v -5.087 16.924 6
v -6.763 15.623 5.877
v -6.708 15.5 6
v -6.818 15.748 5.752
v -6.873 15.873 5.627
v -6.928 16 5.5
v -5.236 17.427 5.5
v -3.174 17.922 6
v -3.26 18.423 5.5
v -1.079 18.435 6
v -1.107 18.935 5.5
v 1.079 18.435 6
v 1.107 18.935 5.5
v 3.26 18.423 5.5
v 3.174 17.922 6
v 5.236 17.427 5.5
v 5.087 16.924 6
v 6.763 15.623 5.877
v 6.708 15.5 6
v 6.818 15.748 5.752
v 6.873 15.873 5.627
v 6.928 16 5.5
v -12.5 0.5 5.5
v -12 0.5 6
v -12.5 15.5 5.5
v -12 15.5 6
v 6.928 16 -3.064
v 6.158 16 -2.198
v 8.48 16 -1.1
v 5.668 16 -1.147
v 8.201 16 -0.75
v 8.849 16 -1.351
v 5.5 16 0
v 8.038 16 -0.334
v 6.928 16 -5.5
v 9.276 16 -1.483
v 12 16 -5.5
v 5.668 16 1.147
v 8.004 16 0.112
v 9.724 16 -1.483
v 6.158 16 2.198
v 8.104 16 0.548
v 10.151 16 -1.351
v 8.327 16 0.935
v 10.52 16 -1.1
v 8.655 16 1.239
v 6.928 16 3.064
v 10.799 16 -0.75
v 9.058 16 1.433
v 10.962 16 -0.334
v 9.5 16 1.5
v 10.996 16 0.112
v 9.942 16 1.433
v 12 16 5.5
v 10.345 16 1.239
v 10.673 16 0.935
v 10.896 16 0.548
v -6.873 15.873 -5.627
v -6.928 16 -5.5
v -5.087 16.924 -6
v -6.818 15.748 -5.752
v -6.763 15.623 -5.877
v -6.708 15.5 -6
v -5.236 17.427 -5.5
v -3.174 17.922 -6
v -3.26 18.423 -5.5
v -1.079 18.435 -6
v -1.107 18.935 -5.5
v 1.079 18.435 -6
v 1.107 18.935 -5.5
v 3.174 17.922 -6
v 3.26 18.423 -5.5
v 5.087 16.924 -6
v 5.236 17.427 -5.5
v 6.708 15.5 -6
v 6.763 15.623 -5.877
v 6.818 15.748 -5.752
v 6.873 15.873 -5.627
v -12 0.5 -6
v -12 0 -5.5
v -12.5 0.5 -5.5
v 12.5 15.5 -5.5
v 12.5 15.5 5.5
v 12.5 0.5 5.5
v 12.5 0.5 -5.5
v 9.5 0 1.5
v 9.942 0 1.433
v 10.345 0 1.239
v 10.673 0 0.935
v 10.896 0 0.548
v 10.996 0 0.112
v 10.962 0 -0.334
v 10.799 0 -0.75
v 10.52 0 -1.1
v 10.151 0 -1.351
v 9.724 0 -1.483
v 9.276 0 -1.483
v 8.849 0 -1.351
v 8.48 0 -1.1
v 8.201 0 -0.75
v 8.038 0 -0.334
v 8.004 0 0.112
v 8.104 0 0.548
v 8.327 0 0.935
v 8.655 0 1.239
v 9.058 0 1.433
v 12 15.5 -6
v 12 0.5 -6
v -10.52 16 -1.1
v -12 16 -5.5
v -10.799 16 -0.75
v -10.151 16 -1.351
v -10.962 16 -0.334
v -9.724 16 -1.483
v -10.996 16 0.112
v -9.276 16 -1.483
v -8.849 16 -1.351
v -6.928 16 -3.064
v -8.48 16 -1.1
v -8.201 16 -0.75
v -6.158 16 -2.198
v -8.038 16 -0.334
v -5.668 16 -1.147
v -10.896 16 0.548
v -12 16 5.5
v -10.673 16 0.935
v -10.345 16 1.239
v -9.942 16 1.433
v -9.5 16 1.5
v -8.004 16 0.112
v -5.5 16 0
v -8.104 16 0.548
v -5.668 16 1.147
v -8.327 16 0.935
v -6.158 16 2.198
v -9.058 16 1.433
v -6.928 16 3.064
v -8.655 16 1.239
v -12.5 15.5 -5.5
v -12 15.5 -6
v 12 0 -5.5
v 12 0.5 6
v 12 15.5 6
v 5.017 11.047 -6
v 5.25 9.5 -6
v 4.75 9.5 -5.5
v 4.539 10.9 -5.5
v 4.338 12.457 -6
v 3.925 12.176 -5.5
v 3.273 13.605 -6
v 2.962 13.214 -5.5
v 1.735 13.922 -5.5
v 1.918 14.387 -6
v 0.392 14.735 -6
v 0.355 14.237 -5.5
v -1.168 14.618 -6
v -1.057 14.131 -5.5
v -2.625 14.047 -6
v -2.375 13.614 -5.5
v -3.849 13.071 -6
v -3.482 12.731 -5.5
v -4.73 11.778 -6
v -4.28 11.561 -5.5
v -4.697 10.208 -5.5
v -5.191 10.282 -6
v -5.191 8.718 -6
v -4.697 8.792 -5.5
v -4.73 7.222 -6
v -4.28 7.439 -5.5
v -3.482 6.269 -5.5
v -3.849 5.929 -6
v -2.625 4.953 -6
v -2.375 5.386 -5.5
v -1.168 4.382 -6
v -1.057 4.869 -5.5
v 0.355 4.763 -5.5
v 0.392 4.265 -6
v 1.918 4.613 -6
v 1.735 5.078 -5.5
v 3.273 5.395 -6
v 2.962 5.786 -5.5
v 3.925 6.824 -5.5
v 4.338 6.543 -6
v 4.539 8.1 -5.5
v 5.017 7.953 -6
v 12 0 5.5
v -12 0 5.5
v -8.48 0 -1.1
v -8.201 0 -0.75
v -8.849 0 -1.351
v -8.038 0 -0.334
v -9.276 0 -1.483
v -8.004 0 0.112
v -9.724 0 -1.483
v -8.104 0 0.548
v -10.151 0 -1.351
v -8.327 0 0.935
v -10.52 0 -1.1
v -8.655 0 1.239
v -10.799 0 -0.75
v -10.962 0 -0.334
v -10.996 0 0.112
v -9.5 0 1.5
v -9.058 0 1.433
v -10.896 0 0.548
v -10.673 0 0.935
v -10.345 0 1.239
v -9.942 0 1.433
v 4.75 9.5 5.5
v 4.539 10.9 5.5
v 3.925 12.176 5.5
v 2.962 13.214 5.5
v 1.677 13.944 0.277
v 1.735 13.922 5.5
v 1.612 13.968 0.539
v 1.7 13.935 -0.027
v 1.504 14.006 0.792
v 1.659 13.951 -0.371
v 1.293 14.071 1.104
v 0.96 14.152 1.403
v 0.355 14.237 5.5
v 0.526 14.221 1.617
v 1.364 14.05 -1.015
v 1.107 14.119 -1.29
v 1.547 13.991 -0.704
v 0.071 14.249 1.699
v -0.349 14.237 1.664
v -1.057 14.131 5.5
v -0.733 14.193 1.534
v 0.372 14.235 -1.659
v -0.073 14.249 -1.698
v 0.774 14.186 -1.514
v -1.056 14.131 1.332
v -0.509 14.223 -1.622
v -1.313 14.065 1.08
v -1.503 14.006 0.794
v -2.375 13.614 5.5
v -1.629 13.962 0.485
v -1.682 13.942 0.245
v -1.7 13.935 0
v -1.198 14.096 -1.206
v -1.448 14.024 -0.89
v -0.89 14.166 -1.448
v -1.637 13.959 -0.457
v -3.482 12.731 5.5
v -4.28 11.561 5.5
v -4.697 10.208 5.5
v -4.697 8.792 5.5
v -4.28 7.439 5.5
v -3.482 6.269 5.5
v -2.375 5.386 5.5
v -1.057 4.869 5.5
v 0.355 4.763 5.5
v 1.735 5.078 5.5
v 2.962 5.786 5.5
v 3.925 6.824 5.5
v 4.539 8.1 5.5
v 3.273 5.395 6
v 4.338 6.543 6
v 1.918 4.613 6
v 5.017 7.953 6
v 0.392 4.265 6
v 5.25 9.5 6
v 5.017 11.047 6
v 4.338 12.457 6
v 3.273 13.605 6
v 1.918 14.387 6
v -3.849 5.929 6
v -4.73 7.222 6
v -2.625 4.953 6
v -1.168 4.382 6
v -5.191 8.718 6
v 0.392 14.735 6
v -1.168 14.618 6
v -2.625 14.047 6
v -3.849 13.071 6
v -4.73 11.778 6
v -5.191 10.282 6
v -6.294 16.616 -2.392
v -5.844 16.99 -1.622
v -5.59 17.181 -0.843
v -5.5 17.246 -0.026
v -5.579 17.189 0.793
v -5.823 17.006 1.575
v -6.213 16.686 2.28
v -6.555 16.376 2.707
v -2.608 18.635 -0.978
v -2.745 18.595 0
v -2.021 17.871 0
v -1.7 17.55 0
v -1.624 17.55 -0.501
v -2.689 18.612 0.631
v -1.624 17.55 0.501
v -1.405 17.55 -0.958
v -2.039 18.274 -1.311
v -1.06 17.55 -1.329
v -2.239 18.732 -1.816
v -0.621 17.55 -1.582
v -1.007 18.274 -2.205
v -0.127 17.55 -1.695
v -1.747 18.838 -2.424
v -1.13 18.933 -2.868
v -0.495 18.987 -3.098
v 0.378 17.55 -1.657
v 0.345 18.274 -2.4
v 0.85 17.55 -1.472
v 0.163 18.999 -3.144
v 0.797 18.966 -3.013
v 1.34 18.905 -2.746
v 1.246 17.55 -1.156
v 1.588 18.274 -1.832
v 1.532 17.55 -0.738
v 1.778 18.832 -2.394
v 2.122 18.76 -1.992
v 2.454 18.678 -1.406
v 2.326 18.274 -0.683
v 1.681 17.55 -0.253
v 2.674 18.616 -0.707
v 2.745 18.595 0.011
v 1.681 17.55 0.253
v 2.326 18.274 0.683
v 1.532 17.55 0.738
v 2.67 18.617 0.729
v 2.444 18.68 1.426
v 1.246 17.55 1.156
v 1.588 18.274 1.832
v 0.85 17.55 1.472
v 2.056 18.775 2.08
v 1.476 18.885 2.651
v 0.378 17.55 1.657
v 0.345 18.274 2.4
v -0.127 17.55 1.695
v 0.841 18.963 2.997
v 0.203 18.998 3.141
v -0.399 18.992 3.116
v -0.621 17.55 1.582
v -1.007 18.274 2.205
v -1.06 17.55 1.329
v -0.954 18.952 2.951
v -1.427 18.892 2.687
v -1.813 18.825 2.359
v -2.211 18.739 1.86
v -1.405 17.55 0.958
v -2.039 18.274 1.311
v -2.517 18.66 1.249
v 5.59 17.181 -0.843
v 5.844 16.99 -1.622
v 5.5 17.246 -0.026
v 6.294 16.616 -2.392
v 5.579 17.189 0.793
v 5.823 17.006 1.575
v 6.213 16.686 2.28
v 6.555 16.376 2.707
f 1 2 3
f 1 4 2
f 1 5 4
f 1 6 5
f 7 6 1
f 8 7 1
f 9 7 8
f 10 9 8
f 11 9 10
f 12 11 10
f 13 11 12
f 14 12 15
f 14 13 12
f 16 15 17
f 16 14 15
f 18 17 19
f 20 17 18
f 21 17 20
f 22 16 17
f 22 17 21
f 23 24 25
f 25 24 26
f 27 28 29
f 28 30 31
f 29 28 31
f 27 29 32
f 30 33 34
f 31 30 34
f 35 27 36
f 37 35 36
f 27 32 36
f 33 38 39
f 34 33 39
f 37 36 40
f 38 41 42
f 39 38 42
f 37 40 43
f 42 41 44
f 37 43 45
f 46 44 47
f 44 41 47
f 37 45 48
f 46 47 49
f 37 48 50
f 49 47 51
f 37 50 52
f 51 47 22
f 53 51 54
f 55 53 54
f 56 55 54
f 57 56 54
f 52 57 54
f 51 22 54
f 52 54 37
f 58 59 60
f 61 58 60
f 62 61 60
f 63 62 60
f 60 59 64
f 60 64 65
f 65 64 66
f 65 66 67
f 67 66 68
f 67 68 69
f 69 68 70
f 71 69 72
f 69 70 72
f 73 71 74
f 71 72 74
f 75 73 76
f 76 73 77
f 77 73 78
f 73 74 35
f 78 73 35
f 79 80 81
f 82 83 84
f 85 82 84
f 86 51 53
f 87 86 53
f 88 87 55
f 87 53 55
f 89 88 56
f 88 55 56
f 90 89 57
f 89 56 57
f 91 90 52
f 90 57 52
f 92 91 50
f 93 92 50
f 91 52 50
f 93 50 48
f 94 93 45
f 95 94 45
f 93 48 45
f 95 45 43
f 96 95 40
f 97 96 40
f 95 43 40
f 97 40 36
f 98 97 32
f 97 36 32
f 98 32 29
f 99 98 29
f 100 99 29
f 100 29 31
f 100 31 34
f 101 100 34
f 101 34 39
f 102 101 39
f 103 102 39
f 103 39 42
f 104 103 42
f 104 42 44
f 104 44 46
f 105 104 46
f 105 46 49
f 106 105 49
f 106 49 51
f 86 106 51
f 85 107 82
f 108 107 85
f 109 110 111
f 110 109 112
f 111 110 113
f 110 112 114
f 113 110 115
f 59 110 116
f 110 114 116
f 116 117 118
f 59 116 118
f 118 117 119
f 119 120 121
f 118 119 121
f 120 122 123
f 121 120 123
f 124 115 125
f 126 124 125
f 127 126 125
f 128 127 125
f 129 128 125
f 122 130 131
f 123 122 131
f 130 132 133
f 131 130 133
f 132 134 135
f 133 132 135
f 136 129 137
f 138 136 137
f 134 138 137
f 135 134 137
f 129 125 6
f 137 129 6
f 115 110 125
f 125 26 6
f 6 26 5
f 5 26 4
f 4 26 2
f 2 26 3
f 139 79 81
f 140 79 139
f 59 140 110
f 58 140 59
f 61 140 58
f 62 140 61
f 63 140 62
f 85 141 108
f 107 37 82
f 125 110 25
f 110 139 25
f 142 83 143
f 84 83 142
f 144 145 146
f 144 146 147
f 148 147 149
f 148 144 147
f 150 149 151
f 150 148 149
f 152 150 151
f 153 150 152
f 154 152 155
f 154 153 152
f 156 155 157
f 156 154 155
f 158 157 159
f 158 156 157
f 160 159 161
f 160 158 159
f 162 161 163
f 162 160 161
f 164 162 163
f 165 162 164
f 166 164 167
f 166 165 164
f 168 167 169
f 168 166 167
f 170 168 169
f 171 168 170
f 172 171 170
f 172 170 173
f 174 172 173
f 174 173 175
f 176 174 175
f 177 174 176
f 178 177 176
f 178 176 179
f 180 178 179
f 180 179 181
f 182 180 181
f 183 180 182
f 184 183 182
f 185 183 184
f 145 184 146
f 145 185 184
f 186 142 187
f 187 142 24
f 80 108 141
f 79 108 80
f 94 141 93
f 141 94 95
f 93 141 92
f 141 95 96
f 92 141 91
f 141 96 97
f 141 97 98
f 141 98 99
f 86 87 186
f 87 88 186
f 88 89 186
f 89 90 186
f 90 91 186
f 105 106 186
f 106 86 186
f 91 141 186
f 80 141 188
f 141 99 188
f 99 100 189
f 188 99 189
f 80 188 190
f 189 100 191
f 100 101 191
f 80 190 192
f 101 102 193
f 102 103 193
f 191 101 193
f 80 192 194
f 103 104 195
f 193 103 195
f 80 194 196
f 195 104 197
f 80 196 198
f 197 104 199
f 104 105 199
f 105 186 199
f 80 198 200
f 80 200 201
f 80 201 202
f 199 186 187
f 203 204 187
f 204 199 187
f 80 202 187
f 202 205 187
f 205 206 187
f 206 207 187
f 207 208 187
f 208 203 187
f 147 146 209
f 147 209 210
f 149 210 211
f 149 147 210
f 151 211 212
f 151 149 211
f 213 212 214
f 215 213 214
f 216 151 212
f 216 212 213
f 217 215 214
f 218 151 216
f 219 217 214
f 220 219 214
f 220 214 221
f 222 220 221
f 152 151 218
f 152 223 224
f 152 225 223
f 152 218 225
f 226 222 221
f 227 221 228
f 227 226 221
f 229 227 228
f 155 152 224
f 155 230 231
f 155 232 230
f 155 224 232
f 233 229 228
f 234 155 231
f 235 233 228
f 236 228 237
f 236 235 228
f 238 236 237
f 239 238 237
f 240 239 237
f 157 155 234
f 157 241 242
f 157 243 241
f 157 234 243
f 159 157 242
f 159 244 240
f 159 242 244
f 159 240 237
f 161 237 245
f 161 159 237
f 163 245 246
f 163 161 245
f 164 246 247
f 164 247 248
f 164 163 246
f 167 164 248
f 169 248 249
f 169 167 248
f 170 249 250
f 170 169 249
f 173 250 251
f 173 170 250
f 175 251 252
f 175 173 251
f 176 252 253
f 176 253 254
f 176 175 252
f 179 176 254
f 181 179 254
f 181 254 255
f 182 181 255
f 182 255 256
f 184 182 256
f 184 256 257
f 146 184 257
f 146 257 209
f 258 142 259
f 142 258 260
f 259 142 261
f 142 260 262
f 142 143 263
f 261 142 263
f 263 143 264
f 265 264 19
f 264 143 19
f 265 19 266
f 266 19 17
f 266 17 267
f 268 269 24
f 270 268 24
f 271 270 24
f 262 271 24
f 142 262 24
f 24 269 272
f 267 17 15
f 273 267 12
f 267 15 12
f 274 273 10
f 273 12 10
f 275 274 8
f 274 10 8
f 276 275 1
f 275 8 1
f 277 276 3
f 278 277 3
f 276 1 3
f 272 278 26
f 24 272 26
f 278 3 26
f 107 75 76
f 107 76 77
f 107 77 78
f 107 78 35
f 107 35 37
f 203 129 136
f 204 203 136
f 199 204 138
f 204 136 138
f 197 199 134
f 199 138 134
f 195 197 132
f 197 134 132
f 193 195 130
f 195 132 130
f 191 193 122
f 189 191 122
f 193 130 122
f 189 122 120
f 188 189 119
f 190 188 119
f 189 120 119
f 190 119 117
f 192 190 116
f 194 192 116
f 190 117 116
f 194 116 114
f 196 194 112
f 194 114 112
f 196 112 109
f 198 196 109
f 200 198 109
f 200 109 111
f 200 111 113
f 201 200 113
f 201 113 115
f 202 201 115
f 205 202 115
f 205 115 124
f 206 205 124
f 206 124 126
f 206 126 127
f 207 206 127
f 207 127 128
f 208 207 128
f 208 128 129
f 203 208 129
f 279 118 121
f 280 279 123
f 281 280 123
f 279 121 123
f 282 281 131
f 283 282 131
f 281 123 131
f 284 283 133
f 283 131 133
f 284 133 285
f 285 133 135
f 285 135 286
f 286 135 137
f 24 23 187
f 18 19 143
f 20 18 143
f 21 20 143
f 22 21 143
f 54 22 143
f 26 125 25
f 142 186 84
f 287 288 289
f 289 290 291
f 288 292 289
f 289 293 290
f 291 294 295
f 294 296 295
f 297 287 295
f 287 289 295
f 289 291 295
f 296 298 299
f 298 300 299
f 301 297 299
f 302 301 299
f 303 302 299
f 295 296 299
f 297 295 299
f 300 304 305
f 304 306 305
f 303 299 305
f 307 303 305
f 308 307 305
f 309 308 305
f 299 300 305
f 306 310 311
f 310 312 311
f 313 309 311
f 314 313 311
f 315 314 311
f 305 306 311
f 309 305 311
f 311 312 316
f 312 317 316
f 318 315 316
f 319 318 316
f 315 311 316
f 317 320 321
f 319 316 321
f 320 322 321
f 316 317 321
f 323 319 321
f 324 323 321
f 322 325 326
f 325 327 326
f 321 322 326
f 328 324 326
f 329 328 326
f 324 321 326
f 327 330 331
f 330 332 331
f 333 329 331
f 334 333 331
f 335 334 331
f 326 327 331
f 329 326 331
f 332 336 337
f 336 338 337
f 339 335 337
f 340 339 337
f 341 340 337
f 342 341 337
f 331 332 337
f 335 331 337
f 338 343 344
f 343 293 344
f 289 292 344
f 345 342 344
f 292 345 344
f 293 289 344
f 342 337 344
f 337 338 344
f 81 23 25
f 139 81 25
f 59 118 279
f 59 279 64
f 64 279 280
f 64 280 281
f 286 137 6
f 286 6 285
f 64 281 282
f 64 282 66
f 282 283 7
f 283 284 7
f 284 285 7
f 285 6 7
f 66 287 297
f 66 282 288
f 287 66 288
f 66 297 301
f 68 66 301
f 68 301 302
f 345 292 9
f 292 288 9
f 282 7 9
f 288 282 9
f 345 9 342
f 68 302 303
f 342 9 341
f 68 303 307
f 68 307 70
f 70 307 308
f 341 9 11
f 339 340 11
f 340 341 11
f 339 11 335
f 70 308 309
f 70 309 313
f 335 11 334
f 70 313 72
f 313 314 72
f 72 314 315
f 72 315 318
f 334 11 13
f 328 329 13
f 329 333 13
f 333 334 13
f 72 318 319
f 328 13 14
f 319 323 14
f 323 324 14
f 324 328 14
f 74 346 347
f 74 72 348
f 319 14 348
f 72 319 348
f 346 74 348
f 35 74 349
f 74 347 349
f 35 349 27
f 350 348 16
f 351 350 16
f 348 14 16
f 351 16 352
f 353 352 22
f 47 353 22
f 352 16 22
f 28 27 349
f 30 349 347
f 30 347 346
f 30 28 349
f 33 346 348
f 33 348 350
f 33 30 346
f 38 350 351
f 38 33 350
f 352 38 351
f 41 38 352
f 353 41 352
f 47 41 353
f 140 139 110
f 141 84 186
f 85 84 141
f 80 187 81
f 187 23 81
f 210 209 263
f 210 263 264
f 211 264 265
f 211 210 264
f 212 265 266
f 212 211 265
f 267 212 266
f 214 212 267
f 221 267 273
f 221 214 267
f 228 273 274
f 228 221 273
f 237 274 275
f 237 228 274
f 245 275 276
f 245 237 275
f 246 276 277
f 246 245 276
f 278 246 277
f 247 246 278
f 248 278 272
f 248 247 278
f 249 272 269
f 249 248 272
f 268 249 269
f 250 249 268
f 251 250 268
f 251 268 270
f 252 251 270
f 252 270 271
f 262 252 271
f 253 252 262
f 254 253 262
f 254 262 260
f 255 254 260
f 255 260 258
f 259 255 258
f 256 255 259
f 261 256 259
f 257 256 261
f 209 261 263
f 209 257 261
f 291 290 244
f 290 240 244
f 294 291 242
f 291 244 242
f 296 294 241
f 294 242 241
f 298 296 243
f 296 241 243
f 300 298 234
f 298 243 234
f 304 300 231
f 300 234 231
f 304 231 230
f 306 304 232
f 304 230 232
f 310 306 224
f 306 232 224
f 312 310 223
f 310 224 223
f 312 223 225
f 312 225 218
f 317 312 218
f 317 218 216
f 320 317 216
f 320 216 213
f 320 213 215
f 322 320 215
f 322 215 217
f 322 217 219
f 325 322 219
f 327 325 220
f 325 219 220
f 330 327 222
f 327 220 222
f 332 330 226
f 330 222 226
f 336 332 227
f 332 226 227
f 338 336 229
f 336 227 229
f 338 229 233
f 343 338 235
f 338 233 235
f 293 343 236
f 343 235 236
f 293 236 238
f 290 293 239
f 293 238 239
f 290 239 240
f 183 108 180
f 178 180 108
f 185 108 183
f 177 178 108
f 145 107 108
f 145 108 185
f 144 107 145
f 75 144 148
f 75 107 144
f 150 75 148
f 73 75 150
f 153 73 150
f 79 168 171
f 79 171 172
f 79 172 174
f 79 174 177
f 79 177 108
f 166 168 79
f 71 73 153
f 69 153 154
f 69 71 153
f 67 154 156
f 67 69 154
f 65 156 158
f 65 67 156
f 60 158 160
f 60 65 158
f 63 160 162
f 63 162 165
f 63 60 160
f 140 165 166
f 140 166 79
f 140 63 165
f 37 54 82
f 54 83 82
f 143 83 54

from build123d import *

# Parameters (mm, degrees)
SKETCH1_R                                       = 4.75
BOSS_EXTRUDE1_DEPTH                             = 6
CUT_EXTRUDE1_REACH                              = 23.172
SKETCH2_R                                       = 1.5
CUT_EXTRUDE2_DEPTH                              = 3
CSK_FOR_M3_FLAT_HEAD_MACHINE_SCREW1_D           = 3.4
CSK_FOR_M3_FLAT_HEAD_MACHINE_SCREW1_DEPTH       = 9
CSK_FOR_M3_FLAT_HEAD_MACHINE_SCREW1_CSINK_D     = 6.3
CSK_FOR_M3_FLAT_HEAD_MACHINE_SCREW1_CSINK_ANGLE = 90
CSK_FOR_M3_FLAT_HEAD_MACHINE_SCREW1_TIP         = 1.021463052
CHAMFER1_SIZE                                   = 0.5


with BuildPart() as part:
    # Sketch1 → Boss-Extrude1 (new, symmetric)
    with BuildSketch(Plane.XY):
        with BuildLine():
            Line((6.92820323, 16), (12.5, 16))
            Line((12.5, 16), (12.5, 0))
            Line((12.5, 0), (-12.5, 0))
            Line((-12.5, 0), (-12.5, 16))
            Line((-12.5, 16), (-6.92820323, 16))
            ThreePointArc((-6.92820323, 16), (0, 19), (6.92820323, 16))
        make_face()
        with Locations((0, 9.5)):
            Circle(SKETCH1_R, mode=Mode.SUBTRACT)
    extrude(amount=BOSS_EXTRUDE1_DEPTH, both=True)

    # Sketch2 → Cut-Extrude1 (cut, up to next)
    with BuildSketch(Plane(origin=(0, 16, 0), x_dir=(1, 0, 0), z_dir=(0, 1, 0)), mode=Mode.PRIVATE) as cut_extrude1_sk1:
        with Locations(Location((-9.5, 0, 0), (0, 0, 270))):
            Circle(SKETCH2_R)
    cut_extrude1_tool1 = extrude(cut_extrude1_sk1.sketch, amount=-CUT_EXTRUDE1_REACH, mode=Mode.PRIVATE) & part.part
    # Sketch2 → Cut-Extrude1 (cut, up to next)
    with BuildSketch(Plane(origin=(0, 16, 0), x_dir=(1, 0, 0), z_dir=(0, 1, 0)), mode=Mode.PRIVATE) as cut_extrude1_sk2:
        with Locations(Location((9.5, 0, 0), (0, 0, 270))):
            Circle(SKETCH2_R)
    cut_extrude1_tool2 = extrude(cut_extrude1_sk2.sketch, amount=-CUT_EXTRUDE1_REACH, mode=Mode.PRIVATE) & part.part
    add(cut_extrude1_tool1.solids().sort_by_distance((-9.5, 16, 0))[0], mode=Mode.SUBTRACT)
    add(cut_extrude1_tool2.solids().sort_by_distance((9.5, 16, 0))[0], mode=Mode.SUBTRACT)

    # Sketch3 → Cut-Extrude2 (cut)
    with BuildSketch(Plane(origin=(0, 16, 0), x_dir=(1, 0, 0), z_dir=(0, 1, 0))):
        with BuildLine():
            Line((6.92820323, -3.06363532), (6.92820323, 3.06363532))
            ThreePointArc((6.92820323, 3.06363532), (5.5, 0), (6.92820323, -3.06363532))
        make_face()
        with BuildLine():
            Line((-6.92820323, -3.06363532), (-6.92820323, 3.06363532))
            ThreePointArc((-6.92820323, 3.06363532), (-5.5, 0), (-6.92820323, -3.06363532))
        make_face()
    extrude(amount=CUT_EXTRUDE2_DEPTH, mode=Mode.SUBTRACT)

    # CSK for M3 Flat Head Machine Screw1
    with Locations(Plane(origin=(0, 19, 0), x_dir=(1, 0, 0), z_dir=(0, 1, 0))):
        with Locations((0, 0)):
            CounterSinkHole(CSK_FOR_M3_FLAT_HEAD_MACHINE_SCREW1_D / 2, CSK_FOR_M3_FLAT_HEAD_MACHINE_SCREW1_CSINK_D / 2, depth=CSK_FOR_M3_FLAT_HEAD_MACHINE_SCREW1_DEPTH, counter_sink_angle=CSK_FOR_M3_FLAT_HEAD_MACHINE_SCREW1_CSINK_ANGLE)
            with Locations((0, 0, -(CSK_FOR_M3_FLAT_HEAD_MACHINE_SCREW1_DEPTH + CSK_FOR_M3_FLAT_HEAD_MACHINE_SCREW1_TIP / 2))):  # 118° drill point
                Cone(0, CSK_FOR_M3_FLAT_HEAD_MACHINE_SCREW1_D / 2, CSK_FOR_M3_FLAT_HEAD_MACHINE_SCREW1_TIP, mode=Mode.SUBTRACT)

    # Chamfer1
    chamfer1_edges = [part.edges().sort_by_distance(p)[0] for p in [
        (12.5, 0, 0),
        (-12.5, 0, 0),
        (-12.5, 16, 0),
        (12.5, 16, 0),
        (0, 19, 6),
        (-9.714101615, 16, 6),
        (-4.75, 9.5, -6),
        (-4.75, 9.5, 6),
        (-12.5, 8, 6),
        (0, 0, 6),
        (12.5, 8, 6),
        (0, 0, -6),
        (-12.5, 8, -6),
        (-9.714101615, 16, -6),
        (0, 19, -6),
        (9.714101615, 16, -6),
        (12.5, 8, -6),
        (9.714101615, 16, 6),
    ]]
    chamfer(chamfer1_edges, length=CHAMFER1_SIZE)


solid = part.part
